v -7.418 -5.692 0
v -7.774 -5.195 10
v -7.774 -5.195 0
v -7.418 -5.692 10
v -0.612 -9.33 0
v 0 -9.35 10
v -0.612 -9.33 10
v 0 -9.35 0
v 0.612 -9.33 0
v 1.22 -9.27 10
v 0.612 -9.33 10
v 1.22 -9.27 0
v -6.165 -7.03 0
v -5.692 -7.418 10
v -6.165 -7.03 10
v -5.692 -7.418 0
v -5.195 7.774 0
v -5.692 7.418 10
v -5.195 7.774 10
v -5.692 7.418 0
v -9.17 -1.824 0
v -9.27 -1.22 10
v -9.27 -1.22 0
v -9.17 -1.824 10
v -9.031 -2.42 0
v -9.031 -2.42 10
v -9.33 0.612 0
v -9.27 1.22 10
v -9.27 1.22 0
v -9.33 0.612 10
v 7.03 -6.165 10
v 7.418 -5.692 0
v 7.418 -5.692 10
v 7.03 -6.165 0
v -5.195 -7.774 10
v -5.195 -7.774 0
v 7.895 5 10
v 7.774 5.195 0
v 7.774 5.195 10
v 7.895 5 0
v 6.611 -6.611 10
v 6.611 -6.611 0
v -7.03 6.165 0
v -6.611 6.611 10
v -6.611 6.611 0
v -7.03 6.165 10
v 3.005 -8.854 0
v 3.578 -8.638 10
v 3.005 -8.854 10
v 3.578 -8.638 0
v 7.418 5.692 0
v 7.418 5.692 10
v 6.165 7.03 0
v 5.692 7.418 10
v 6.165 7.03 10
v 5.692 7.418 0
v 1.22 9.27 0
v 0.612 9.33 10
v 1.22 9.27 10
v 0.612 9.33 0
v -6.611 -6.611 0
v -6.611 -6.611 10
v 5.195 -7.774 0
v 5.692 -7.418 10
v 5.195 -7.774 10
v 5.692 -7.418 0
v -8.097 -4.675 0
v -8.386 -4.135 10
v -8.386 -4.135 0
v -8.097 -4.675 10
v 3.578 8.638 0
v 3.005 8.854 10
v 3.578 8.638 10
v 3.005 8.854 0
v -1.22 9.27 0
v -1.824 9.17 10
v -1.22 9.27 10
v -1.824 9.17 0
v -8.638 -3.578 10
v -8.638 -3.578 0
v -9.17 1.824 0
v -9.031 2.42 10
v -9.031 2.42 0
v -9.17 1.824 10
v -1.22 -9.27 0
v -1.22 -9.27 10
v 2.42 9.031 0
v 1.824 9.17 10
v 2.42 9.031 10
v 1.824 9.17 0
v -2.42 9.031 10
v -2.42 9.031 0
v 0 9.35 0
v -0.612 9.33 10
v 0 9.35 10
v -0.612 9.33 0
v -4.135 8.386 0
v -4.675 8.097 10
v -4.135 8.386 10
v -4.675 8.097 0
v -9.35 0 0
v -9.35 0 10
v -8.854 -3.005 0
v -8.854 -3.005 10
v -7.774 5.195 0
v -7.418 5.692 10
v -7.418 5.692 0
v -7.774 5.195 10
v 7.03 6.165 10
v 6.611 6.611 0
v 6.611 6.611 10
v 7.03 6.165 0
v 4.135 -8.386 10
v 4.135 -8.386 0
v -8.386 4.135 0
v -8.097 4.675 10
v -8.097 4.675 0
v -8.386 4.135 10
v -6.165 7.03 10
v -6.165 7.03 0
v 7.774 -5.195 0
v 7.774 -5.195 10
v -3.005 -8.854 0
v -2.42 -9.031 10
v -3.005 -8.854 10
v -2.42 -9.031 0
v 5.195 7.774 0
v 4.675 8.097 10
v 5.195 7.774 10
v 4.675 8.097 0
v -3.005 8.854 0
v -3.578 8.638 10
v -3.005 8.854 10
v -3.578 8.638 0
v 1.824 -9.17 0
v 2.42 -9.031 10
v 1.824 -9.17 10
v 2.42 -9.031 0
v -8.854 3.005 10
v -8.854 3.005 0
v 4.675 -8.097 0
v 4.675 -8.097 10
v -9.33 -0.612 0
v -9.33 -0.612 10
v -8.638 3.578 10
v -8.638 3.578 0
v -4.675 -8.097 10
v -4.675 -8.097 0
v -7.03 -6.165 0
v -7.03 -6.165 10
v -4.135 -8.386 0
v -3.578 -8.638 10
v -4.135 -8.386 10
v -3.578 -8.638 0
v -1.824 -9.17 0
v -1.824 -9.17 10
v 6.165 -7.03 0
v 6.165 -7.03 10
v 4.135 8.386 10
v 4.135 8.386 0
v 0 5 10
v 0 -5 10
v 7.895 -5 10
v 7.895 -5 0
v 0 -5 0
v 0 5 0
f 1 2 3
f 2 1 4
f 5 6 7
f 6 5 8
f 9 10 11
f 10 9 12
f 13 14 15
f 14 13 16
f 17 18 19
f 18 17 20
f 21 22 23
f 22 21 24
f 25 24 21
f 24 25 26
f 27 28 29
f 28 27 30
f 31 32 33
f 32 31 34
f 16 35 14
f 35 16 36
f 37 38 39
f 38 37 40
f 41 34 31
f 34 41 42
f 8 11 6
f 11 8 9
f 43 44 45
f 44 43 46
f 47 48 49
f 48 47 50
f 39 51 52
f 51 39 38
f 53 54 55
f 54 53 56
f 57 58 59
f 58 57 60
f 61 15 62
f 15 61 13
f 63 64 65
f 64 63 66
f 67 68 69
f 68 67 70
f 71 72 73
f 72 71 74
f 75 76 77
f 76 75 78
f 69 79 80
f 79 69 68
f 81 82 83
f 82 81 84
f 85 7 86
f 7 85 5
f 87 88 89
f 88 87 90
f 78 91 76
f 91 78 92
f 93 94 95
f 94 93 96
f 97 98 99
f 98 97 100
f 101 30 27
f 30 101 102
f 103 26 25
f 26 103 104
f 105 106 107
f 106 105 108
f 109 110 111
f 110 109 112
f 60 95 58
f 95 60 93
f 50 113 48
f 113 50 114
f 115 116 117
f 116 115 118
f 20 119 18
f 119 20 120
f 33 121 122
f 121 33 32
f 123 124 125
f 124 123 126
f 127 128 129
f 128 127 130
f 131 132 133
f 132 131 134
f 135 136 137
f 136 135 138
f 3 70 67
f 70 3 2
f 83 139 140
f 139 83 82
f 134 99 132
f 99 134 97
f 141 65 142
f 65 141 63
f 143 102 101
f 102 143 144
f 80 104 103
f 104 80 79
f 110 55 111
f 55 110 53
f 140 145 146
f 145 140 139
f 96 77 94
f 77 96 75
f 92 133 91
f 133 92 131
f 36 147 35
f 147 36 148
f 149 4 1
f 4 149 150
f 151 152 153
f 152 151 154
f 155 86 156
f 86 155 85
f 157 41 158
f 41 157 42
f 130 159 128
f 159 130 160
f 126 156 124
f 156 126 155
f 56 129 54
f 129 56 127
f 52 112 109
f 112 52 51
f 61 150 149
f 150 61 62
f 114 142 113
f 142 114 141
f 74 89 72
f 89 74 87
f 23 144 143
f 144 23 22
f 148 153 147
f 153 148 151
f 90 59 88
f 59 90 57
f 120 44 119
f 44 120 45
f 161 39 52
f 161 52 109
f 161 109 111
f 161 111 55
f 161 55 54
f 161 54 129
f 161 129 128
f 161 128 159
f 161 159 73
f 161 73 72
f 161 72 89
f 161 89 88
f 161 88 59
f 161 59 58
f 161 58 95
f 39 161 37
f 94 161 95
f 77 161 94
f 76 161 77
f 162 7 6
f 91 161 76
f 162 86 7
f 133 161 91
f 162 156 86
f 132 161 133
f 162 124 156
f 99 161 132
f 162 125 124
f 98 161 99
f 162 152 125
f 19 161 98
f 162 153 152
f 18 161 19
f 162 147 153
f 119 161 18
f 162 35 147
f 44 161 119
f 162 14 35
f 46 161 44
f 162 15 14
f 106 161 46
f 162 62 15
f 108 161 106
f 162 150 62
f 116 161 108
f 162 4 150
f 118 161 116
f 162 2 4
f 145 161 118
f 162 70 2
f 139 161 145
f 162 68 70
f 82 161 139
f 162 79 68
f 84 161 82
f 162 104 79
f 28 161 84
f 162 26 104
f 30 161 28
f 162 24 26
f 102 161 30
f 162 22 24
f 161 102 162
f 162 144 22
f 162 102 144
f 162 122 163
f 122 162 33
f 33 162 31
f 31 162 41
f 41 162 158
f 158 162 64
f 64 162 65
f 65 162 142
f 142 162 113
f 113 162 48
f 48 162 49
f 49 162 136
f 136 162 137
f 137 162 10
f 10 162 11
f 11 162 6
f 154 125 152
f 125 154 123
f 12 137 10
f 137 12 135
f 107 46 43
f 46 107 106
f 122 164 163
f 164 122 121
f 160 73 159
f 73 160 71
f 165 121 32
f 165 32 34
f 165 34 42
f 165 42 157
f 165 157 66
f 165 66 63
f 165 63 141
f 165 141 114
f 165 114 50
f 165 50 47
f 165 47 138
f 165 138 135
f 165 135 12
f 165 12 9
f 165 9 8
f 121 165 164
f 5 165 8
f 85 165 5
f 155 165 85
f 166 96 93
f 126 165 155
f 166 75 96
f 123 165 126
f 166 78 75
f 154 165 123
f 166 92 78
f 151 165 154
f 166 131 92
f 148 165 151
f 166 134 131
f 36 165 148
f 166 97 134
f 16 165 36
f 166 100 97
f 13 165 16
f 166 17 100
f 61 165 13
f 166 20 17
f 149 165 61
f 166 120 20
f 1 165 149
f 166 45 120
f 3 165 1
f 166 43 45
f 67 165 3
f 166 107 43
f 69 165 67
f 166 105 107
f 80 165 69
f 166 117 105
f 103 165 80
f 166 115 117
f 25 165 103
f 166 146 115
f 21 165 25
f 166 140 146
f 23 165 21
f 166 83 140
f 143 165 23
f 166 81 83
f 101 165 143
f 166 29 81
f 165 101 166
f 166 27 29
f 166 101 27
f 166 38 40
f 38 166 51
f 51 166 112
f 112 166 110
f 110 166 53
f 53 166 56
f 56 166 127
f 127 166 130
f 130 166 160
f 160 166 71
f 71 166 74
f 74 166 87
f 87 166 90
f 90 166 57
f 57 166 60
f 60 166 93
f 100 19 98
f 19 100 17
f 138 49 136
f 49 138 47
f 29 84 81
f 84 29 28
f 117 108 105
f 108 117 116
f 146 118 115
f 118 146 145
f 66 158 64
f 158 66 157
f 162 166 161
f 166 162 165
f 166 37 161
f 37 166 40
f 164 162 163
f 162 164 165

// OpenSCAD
// Tubing clip for 12.7 mm (1/2 inch) lab stand rod
// Print orientation: flat on bed, extruded upward in +Z

// ---------- Parameters ----------
rod_d        = 12.7;   // stand rod diameter
ring_w       = 3;      // rod ring wall thickness
ring_od      = rod_d + 2 * ring_w;  // rod ring outer diameter (18.7 mm)
ring_h       = 10;     // clip height (Z)

tub_d        = 6;      // tubing ring inner diameter
tub_w        = 2;      // tubing ring wall thickness
tub_od       = tub_d + 2 * tub_w;  // tubing ring outer diameter (10 mm)
tub_x        = 15;     // tubing ring centre X
tub_y        = 0;      // tubing ring centre Y

bridge_x0    = 8;      // bridge start X
bridge_x1    = 12;     // bridge end X
bridge_w     = 6;      // bridge width (Y)

eps          = 0.5;    // cutter overshoot past faces

$fn = 96;

// ---------- Model ----------
difference() {
    union() {
        // Rod ring
        translate([0, 0, 0])
            cylinder(d = ring_od, h = ring_h);

        // Tubing ring
        translate([tub_x, tub_y, 0])
            cylinder(d = tub_od, h = ring_h);

        // Solid bridge
        translate([bridge_x0, -bridge_w / 2, 0])
            cube([bridge_x1 - bridge_x0, bridge_w, ring_h]);
    }

    // Rod ring opening on -X side (x < 0, -5 < y < 5)
    translate([0, -5, -eps])
        cube([ring_od + 2 * eps, 10, ring_h + 2 * eps]);

    // Tubing ring opening on +X side (x > 15, -2.25 < y < 2.25)
    translate([tub_x, -2.25, -eps])
        cube([ring_od + 2 * eps, 4.5, ring_h + 2 * eps]);
}
